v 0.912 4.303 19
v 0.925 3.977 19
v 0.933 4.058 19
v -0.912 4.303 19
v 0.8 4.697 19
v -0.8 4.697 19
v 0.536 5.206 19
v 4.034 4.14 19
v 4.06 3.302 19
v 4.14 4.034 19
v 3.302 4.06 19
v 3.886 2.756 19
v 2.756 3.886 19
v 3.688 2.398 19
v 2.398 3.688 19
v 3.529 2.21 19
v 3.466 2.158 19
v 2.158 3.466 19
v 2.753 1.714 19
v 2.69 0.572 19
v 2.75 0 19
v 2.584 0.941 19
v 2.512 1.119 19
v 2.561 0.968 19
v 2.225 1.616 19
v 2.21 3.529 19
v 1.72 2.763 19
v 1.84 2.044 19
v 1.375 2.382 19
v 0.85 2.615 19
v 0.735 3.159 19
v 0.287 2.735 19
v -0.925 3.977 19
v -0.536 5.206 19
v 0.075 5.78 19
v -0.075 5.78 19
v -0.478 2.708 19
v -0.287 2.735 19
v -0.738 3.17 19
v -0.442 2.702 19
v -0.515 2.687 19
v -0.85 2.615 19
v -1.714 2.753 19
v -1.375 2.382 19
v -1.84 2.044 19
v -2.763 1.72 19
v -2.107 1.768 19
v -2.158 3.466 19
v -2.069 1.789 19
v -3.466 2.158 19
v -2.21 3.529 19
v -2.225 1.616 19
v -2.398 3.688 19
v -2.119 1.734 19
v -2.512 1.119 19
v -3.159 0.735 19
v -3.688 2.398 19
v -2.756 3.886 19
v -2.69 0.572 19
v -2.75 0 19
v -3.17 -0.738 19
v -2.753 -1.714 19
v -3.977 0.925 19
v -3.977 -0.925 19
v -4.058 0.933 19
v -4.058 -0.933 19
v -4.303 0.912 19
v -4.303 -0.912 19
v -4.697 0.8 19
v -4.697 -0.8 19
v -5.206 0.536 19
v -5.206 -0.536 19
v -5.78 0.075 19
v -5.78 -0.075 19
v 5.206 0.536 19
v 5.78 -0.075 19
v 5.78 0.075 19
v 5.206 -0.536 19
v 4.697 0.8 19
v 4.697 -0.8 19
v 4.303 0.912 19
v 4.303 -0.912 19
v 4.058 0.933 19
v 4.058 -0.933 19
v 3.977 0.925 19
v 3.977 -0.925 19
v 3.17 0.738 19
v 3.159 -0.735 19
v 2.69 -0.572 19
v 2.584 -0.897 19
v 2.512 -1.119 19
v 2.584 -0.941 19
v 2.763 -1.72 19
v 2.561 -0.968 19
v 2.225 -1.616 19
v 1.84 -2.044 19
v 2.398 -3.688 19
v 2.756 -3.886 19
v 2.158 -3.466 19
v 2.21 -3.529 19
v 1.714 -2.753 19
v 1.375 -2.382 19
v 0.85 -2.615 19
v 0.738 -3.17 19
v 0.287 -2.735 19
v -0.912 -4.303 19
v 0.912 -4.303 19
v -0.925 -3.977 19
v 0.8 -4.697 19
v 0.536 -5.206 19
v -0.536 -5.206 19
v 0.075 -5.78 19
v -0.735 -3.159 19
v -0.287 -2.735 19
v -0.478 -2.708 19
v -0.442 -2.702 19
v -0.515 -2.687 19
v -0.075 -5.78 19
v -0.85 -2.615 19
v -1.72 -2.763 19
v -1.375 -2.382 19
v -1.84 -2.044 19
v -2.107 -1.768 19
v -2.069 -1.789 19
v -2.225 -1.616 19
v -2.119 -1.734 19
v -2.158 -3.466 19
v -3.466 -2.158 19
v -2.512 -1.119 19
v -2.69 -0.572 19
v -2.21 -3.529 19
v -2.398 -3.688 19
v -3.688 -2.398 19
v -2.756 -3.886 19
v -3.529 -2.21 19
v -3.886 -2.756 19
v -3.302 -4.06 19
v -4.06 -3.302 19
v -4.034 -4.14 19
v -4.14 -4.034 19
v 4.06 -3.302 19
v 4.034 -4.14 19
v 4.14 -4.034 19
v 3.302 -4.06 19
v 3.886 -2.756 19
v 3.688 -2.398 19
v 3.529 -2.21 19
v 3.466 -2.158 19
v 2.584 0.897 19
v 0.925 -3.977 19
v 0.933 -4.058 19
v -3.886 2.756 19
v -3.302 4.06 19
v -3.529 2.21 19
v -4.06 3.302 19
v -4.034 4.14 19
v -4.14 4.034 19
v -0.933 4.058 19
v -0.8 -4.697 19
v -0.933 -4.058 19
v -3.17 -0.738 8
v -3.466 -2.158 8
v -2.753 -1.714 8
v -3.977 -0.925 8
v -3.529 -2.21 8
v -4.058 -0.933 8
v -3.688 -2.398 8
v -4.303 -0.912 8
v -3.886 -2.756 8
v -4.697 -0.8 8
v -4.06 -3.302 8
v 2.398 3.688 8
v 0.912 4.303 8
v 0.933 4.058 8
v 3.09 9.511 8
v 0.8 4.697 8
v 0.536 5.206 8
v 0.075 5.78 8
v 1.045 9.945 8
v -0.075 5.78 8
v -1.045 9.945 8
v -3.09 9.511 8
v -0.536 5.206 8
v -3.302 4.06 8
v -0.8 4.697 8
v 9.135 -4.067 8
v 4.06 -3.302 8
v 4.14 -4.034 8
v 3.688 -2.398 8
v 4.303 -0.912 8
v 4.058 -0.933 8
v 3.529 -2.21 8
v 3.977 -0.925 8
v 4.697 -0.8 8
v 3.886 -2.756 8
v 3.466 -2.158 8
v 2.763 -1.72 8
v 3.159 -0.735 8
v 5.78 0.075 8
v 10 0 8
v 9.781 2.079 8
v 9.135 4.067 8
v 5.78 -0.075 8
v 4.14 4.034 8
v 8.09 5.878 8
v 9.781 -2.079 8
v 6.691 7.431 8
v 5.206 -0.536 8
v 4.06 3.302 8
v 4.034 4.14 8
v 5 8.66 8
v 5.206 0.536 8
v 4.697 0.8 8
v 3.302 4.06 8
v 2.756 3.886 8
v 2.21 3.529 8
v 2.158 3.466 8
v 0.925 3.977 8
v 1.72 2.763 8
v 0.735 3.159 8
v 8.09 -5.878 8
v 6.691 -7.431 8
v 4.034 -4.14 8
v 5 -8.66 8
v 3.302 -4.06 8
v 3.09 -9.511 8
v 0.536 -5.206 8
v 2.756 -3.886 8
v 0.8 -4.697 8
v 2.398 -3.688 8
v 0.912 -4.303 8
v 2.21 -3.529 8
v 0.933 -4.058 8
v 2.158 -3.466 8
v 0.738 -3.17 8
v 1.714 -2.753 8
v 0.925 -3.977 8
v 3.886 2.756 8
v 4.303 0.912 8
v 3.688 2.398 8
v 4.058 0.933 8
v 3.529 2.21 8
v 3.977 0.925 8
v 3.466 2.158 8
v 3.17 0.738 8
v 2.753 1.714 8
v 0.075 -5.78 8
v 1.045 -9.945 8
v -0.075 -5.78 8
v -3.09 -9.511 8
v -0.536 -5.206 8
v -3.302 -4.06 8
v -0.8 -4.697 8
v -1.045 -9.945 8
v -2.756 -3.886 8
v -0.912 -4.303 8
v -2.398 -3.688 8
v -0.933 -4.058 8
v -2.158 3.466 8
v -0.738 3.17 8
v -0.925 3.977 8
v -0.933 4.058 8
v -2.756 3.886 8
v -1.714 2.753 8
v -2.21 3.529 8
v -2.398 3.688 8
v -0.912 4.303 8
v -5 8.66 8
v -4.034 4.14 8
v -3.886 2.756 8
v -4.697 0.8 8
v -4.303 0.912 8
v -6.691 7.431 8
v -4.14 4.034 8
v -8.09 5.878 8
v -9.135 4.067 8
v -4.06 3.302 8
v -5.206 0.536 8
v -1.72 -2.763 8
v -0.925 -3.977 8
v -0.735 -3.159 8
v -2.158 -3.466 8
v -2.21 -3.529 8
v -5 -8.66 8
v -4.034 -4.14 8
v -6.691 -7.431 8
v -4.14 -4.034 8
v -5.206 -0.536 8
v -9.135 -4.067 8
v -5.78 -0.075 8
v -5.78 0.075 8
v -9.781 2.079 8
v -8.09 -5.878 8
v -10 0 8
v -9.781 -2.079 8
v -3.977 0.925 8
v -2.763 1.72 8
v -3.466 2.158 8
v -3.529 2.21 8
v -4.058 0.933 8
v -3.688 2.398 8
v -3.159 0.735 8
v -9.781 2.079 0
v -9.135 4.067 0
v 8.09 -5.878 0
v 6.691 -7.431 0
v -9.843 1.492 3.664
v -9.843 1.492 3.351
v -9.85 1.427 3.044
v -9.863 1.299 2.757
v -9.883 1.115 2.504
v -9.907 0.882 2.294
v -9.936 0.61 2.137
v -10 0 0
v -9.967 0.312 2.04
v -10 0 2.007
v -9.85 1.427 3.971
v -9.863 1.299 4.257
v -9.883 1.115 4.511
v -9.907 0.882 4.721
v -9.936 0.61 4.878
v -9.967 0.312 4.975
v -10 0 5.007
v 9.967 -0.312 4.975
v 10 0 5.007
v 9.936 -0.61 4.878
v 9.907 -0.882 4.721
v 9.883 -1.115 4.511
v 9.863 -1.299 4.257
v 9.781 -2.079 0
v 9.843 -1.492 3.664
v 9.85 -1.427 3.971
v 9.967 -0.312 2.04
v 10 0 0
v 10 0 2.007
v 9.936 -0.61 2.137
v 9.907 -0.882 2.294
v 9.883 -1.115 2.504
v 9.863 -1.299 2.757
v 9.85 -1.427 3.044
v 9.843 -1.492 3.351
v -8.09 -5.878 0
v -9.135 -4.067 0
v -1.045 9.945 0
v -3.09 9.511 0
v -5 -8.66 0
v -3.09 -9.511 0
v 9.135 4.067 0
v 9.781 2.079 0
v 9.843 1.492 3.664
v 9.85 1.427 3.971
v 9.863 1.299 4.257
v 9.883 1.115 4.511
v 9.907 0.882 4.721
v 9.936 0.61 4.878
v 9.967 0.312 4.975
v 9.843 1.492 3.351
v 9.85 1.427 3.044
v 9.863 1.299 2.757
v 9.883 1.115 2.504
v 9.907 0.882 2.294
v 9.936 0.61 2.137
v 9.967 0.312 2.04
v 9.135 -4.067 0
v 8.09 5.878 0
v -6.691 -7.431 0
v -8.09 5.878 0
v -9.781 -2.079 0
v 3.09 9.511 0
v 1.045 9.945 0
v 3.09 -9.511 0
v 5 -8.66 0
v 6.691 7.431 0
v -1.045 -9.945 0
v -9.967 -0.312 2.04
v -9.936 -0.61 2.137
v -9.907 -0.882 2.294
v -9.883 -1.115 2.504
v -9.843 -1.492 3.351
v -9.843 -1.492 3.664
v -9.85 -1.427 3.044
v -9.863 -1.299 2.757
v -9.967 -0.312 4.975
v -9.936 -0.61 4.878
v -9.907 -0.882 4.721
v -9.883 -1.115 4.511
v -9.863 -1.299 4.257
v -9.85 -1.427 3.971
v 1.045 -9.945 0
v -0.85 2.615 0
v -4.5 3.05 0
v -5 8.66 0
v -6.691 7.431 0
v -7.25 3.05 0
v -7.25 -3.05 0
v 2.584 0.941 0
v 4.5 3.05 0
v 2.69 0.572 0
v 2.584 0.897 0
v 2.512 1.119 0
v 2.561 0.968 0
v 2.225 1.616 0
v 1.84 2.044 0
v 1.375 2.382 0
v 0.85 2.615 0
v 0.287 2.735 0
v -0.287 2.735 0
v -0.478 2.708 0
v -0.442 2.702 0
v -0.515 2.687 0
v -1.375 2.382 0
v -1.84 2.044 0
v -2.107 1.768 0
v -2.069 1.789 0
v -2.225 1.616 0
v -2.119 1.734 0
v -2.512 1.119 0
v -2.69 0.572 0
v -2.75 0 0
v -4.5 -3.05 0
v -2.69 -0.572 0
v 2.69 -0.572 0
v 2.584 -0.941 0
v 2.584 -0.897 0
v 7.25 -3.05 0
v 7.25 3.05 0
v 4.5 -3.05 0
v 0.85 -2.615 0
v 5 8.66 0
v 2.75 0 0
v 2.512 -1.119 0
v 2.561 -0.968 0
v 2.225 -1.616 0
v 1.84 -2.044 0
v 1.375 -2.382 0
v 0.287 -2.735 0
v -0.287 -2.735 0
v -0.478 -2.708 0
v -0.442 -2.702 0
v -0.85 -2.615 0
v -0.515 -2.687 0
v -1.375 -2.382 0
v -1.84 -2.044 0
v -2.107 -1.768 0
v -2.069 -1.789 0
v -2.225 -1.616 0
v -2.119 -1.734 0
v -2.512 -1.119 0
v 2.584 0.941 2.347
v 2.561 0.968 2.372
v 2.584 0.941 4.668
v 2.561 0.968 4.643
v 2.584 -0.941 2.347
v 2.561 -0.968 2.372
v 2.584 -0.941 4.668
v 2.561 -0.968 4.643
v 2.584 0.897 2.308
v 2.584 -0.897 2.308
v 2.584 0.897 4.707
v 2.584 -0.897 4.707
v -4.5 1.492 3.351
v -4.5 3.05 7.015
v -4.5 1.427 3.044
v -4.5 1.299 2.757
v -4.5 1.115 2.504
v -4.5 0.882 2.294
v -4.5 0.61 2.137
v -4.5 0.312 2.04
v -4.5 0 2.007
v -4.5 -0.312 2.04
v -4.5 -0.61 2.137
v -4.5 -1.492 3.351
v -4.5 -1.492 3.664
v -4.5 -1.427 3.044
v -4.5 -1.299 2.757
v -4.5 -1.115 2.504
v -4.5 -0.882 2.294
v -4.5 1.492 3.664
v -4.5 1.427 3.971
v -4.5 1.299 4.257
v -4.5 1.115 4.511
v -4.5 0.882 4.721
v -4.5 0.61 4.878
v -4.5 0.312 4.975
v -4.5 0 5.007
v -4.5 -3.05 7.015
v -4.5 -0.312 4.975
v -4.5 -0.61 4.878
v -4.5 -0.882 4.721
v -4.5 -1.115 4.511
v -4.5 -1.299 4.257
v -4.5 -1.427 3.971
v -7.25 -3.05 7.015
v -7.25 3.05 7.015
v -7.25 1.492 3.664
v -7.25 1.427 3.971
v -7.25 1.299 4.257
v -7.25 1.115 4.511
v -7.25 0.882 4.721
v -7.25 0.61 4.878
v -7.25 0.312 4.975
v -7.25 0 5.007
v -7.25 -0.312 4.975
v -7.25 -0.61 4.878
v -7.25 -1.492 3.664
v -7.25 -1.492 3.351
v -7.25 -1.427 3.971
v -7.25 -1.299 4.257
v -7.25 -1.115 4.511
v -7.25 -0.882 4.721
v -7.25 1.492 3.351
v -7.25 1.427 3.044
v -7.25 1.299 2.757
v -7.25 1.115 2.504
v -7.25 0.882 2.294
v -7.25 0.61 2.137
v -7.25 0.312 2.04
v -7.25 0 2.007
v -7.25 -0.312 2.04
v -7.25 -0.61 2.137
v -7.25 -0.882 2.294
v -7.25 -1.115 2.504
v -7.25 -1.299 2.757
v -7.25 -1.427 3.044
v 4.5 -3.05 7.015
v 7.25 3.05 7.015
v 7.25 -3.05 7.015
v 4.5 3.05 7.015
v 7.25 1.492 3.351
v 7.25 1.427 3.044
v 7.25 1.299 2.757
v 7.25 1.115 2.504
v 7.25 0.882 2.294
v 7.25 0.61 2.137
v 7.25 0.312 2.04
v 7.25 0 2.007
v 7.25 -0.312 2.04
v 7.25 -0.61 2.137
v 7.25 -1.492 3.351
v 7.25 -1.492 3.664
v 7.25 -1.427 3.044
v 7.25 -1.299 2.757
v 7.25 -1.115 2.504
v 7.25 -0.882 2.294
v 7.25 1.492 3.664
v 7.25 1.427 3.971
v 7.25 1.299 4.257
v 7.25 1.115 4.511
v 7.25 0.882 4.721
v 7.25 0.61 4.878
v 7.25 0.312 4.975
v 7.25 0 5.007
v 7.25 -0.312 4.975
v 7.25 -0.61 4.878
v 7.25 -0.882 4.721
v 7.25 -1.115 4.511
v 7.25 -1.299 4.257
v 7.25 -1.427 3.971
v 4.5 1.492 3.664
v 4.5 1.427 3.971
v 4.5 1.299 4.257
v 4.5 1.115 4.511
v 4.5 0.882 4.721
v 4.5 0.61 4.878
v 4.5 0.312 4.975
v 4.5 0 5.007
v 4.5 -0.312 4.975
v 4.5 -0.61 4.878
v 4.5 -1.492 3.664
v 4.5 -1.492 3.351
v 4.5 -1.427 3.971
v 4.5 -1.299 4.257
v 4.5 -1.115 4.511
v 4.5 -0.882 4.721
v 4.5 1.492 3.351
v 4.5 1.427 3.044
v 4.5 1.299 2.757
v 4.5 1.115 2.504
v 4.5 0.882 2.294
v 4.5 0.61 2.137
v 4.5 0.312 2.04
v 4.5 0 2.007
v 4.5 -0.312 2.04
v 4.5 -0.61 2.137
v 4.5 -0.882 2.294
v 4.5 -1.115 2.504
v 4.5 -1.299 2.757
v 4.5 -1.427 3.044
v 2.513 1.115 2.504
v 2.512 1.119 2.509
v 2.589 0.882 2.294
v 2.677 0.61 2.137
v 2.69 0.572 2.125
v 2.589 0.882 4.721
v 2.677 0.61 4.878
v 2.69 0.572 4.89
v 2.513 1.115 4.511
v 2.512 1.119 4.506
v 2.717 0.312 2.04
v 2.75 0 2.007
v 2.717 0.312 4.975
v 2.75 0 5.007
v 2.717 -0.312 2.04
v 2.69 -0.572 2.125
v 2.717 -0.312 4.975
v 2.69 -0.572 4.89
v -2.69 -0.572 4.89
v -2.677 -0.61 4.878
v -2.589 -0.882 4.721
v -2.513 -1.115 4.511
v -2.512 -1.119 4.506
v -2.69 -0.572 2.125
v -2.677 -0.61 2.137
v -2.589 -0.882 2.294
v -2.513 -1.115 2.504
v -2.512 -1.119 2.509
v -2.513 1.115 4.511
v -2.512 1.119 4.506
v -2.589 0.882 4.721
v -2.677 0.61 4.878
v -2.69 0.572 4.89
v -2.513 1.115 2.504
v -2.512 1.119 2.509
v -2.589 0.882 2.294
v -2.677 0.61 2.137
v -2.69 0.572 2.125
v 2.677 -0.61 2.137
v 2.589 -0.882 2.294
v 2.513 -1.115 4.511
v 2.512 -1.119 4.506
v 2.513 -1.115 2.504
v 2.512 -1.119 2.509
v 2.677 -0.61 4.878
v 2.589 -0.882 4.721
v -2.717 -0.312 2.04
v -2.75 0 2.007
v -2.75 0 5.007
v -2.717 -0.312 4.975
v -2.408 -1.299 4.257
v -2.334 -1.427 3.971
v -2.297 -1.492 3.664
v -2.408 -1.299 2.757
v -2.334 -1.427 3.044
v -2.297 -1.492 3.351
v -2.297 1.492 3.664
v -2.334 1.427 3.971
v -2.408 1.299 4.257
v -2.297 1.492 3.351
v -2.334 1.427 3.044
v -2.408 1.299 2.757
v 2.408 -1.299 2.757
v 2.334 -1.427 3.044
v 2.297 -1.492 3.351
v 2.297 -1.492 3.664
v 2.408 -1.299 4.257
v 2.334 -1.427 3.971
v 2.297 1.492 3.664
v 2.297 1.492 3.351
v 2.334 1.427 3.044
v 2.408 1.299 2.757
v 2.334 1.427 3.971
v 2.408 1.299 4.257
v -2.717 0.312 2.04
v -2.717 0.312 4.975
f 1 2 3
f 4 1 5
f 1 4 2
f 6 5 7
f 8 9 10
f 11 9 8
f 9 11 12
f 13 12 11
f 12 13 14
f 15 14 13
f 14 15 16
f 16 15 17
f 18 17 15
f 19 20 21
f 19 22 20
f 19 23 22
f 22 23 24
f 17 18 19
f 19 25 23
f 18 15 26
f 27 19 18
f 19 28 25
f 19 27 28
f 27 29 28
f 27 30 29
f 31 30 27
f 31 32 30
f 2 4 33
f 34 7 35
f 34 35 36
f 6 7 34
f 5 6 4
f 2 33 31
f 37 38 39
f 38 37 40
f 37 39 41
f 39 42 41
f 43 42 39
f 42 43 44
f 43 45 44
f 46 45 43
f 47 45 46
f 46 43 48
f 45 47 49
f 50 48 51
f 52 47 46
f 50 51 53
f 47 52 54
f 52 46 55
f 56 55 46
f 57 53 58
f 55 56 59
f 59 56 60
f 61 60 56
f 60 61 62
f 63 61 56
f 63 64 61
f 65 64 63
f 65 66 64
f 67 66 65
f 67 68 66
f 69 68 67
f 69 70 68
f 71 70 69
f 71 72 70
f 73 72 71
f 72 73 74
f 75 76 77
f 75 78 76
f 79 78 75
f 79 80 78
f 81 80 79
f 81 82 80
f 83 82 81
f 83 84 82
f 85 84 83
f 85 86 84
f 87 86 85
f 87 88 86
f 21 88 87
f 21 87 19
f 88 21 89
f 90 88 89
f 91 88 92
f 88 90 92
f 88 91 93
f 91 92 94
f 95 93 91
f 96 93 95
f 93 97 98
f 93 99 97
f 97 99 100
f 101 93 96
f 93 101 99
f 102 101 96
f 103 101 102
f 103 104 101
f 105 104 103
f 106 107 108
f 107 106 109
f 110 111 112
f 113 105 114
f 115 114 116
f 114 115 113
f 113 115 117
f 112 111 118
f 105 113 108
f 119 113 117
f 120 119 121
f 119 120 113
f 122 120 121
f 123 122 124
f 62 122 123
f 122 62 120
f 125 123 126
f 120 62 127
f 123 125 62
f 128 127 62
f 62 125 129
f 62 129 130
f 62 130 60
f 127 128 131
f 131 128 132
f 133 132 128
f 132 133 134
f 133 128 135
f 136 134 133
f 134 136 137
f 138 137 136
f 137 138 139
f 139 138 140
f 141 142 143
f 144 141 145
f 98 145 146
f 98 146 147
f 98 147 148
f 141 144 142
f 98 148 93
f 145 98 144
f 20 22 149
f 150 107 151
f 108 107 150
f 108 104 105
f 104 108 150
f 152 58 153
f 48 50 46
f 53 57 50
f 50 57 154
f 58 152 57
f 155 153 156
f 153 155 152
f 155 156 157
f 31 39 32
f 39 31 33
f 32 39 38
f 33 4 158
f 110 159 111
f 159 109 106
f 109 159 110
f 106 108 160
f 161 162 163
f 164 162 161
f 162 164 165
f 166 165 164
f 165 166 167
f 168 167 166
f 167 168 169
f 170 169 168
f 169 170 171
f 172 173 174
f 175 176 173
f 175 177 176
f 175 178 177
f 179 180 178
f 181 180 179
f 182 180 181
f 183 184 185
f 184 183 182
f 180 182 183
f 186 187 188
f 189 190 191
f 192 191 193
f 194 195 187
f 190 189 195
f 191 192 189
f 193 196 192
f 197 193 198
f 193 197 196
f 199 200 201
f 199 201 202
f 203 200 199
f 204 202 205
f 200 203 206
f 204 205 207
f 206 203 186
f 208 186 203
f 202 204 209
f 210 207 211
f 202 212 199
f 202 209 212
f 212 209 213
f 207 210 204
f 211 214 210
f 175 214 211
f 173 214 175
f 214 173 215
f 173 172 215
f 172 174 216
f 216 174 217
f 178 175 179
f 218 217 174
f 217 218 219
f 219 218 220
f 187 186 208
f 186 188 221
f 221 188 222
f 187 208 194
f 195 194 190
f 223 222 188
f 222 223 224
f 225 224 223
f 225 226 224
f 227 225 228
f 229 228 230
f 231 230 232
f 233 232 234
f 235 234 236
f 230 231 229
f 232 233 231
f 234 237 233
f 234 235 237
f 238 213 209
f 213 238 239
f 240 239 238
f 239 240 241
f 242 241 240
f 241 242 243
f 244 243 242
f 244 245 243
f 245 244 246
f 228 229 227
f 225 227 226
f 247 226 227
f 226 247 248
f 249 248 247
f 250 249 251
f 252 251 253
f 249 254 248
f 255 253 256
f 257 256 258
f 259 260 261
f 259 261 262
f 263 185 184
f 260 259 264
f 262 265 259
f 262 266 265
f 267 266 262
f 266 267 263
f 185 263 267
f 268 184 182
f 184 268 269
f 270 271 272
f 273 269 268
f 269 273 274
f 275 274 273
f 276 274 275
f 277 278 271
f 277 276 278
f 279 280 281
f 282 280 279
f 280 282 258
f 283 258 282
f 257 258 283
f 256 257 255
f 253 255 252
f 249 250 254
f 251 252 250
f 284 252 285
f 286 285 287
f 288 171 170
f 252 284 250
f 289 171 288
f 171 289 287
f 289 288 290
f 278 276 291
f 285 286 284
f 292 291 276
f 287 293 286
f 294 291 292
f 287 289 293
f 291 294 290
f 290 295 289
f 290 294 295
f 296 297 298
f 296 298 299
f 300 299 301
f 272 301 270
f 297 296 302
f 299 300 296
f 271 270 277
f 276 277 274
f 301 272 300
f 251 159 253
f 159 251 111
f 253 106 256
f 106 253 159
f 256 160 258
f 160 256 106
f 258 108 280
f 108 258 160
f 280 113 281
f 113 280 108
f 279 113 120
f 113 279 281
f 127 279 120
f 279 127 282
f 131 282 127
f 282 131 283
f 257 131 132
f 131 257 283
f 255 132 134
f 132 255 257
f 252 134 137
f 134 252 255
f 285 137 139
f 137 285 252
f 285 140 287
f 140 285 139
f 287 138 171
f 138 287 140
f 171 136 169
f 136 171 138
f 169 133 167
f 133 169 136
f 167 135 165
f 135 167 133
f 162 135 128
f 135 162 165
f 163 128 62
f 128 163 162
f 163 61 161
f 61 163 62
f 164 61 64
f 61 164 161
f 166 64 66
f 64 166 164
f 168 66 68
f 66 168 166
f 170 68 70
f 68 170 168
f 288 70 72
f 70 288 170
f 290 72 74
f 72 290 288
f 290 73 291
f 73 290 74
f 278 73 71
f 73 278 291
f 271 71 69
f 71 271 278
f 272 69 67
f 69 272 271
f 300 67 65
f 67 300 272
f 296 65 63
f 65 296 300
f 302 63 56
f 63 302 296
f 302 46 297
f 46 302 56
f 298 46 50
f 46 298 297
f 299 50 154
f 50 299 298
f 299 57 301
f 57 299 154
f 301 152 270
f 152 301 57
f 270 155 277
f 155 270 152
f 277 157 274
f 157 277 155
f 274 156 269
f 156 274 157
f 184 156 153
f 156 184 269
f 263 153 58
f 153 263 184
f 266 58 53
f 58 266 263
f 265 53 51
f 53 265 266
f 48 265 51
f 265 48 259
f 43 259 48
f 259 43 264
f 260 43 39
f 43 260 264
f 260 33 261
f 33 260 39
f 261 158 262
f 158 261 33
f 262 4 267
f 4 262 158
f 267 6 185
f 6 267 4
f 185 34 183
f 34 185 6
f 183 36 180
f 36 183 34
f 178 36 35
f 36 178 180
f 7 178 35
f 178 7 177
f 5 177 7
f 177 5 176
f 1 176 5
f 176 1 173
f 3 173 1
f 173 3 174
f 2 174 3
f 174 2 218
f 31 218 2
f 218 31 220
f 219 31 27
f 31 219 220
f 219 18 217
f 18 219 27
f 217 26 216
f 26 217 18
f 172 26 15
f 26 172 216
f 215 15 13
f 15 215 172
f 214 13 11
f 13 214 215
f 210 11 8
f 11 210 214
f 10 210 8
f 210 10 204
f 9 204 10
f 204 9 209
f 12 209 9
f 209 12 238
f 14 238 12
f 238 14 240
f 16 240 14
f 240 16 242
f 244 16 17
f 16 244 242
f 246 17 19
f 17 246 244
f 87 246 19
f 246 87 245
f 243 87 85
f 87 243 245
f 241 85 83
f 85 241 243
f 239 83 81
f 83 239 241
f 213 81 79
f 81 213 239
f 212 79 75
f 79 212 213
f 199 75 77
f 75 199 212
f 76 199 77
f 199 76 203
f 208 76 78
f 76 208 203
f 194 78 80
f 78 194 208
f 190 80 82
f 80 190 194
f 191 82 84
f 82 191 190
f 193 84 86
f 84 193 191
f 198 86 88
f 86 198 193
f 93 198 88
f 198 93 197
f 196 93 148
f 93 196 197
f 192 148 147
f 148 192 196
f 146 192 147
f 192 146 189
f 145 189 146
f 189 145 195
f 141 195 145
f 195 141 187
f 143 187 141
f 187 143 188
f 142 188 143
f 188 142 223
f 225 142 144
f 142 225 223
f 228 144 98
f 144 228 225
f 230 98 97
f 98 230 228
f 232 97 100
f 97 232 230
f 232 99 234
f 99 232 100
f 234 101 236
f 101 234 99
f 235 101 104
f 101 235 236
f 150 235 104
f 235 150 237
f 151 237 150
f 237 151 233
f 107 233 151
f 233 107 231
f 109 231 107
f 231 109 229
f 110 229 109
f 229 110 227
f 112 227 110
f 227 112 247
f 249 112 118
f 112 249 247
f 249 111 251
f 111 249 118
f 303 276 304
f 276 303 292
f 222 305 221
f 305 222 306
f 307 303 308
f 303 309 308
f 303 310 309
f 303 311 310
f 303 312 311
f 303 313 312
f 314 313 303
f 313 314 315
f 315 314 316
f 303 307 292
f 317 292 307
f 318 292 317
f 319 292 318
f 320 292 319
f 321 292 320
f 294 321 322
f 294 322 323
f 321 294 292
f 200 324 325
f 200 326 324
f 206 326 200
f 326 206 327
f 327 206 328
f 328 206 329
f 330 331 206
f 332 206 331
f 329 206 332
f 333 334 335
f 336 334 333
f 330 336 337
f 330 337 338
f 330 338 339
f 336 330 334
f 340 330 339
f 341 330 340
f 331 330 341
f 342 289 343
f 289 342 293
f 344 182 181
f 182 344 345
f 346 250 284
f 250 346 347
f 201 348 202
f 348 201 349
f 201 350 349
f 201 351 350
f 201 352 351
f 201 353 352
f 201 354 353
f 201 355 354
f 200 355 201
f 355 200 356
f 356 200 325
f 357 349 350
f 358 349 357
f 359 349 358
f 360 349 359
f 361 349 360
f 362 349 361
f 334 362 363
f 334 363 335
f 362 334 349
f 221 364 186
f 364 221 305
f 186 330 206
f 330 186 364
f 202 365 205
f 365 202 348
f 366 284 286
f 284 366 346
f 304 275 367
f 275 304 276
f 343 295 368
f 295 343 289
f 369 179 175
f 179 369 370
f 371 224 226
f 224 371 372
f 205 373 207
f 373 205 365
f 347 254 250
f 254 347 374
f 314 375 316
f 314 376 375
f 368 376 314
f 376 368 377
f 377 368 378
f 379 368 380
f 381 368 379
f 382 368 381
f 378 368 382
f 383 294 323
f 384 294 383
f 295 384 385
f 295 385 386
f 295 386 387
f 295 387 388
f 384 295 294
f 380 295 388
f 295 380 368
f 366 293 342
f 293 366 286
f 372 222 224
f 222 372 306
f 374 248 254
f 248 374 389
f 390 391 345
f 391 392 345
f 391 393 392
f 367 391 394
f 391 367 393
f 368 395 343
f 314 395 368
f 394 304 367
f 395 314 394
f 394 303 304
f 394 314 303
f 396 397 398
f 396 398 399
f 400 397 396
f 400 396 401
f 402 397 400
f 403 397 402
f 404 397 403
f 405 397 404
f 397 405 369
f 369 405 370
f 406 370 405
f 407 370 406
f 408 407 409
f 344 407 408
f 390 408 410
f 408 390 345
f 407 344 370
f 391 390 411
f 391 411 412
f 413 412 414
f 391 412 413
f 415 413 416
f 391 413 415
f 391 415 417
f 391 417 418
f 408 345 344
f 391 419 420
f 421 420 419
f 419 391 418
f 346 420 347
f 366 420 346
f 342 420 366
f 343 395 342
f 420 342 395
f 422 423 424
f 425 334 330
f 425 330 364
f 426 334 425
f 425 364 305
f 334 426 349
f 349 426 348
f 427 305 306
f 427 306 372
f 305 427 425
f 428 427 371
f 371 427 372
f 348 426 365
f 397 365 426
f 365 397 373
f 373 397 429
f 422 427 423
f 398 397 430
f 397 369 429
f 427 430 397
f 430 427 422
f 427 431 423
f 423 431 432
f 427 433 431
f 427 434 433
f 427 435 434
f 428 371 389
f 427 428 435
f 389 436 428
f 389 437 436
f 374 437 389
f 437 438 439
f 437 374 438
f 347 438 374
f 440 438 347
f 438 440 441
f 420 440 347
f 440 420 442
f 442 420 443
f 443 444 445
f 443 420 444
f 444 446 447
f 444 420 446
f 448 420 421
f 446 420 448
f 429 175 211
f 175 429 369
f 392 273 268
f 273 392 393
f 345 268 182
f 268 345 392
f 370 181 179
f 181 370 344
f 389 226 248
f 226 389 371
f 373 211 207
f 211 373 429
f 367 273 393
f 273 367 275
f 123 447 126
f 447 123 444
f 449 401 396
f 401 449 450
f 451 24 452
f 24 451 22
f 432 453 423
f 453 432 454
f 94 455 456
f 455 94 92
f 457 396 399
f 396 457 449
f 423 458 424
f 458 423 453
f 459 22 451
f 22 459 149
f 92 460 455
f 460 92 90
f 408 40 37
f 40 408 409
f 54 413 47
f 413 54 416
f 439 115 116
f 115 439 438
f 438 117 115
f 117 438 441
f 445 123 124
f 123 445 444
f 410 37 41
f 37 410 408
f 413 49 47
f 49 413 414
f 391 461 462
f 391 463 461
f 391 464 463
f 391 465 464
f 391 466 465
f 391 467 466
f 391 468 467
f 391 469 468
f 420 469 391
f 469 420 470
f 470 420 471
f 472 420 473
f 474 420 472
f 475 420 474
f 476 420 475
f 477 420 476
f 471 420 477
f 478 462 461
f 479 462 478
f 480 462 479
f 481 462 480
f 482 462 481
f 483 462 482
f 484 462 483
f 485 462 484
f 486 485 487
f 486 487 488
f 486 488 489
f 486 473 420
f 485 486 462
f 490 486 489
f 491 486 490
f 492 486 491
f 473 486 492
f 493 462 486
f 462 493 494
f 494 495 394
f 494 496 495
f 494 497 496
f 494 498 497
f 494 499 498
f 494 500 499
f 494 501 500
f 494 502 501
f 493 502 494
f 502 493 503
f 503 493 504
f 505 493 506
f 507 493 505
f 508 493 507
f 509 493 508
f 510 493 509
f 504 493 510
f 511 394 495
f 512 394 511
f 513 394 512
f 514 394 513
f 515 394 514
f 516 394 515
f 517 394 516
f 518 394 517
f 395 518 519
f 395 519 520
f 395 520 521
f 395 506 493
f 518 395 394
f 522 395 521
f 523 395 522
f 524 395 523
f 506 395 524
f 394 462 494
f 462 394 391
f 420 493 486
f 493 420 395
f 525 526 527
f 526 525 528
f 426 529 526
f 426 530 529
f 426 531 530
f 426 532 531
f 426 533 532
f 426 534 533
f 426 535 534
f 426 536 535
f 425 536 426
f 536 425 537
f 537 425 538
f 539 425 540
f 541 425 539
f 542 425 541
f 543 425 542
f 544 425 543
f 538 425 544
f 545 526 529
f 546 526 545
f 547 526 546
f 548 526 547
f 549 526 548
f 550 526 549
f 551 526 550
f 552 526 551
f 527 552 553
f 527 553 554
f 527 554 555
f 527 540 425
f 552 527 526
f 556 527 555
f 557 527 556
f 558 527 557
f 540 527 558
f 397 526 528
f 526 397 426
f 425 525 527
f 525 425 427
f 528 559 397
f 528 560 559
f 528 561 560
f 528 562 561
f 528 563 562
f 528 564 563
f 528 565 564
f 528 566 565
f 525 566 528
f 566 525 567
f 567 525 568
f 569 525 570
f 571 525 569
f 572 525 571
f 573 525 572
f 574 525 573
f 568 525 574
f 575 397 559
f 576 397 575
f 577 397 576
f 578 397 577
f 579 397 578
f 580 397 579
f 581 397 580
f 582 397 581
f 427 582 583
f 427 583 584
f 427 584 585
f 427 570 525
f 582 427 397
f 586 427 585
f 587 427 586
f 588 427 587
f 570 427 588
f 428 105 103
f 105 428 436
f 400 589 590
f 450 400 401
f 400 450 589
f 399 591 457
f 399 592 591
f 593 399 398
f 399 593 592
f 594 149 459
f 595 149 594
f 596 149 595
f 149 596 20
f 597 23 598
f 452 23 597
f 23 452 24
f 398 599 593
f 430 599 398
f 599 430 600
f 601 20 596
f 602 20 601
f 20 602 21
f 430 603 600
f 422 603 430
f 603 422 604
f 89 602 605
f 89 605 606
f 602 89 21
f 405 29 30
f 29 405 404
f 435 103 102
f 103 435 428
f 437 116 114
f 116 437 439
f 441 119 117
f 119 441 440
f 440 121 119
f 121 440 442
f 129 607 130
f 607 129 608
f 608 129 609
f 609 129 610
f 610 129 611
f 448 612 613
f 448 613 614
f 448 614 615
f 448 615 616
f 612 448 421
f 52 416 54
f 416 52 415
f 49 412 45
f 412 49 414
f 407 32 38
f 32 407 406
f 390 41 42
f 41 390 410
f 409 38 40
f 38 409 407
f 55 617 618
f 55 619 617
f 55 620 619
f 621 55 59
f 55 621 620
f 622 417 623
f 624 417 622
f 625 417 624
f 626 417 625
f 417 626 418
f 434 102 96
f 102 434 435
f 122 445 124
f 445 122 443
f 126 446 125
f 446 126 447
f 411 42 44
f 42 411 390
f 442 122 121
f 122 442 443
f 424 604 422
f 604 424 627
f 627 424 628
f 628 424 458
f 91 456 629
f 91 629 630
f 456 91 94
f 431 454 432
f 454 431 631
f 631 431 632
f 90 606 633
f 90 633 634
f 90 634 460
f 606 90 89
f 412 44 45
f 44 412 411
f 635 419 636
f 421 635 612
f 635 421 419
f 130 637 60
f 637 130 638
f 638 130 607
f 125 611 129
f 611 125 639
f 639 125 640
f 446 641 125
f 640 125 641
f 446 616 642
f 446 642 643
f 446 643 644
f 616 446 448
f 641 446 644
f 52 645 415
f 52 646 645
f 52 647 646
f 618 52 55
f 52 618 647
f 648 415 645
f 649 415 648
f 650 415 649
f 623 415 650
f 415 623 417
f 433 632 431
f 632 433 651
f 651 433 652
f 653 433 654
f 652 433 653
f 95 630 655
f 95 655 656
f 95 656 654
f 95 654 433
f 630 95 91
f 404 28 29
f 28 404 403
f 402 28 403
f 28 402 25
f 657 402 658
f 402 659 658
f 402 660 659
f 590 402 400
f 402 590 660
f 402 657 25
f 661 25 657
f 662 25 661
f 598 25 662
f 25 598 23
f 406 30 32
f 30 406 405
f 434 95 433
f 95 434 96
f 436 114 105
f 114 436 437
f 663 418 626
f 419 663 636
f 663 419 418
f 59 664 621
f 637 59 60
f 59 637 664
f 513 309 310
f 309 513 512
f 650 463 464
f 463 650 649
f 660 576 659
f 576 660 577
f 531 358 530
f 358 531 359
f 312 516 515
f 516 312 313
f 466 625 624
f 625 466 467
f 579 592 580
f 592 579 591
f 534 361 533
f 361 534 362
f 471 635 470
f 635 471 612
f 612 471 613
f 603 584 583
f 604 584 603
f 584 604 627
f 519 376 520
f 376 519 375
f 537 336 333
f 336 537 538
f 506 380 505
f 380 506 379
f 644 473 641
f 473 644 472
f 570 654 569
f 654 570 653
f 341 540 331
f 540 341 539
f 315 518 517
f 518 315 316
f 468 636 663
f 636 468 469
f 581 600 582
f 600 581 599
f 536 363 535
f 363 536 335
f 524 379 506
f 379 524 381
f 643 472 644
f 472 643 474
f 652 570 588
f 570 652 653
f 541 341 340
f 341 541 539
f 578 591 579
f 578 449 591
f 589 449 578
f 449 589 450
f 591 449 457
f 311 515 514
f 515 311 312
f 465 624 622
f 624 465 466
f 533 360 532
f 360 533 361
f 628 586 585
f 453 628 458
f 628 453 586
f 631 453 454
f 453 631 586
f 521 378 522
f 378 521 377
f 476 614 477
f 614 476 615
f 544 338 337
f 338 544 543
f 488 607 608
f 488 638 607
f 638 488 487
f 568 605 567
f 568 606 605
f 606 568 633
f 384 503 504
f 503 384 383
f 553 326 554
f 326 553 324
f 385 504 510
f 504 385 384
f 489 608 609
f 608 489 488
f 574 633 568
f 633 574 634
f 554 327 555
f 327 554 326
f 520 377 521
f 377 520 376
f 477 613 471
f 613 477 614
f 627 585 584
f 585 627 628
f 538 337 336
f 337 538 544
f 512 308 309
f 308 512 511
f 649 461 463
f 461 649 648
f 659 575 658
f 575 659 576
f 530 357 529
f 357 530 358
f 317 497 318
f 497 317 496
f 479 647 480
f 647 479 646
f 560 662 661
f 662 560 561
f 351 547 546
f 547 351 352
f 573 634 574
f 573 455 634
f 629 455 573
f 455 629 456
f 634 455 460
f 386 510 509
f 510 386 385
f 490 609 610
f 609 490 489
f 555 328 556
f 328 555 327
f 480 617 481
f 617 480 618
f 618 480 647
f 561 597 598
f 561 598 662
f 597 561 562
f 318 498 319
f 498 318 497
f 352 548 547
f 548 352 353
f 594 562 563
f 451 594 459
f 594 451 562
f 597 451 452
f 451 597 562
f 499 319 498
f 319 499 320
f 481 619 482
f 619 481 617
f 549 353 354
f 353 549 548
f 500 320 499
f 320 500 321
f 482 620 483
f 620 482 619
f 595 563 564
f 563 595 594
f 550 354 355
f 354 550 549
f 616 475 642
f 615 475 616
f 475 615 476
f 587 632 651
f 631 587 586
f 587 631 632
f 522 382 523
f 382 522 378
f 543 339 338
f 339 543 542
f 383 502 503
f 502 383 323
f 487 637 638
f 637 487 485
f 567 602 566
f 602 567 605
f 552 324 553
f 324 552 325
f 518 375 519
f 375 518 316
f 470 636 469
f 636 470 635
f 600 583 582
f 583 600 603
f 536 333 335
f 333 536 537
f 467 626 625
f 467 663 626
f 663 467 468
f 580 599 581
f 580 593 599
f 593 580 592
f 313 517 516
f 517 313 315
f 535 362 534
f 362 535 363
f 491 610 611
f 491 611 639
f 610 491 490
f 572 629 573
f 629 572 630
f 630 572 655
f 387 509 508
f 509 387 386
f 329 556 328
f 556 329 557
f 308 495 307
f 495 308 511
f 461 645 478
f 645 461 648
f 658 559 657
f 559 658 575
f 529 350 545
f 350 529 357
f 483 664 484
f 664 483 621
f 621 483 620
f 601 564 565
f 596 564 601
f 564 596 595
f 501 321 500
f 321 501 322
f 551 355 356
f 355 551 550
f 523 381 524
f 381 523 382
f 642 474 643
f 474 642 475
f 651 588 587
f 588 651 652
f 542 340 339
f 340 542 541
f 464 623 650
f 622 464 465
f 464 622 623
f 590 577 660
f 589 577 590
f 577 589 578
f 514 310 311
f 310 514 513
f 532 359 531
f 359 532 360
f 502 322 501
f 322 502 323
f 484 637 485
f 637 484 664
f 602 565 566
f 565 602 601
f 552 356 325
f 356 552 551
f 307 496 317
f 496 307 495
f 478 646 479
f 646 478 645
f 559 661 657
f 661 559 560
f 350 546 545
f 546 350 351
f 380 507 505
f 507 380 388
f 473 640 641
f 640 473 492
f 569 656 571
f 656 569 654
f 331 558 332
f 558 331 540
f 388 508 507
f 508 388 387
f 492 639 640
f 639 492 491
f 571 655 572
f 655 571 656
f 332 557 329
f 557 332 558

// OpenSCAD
/**
 * @author      Ben
 * @date        2021/07/26
 * @description Stackable Planetary Gearbox for 775 DC Motor
 */
use <involute_gears.scad>

//default settings
// pitch=0.865;            //diametric pitch = teeth/diam
// gear_thickness=11;
// pilot_diam=23;

clearance=0.5;
backlash=0.45;
pressure_angle=28;
wall=1;
extra=0.01;
circle_precision=0.1;
addendum_adjustment=1.4;

//test();
// part can be: [sun, intcarrier, finalcarrier, planet, housing, motor, cover]
print_parts(part="sun", stages=1);
// print_parts(part="planet", stages=1);
// print_parts(part="housing", stages=1);
// print_parts(part="motor", stages=1);
// print_parts(part="cover", stages=1);
// print_parts(part="intcarrier", stages=1);
// print_parts(part="finalcarrier", stages=1);


//singleprint();
//multistage_assembly(stages=4);
//housing();
//sun();
//planet();
//carrier(final=false);
//cover();

// part can be sun, intcarrier, finalcarrier, planet, housing or cover
module print_parts(ring_teeth=32, sun_teeth=8, stages=2, part="housing") {
    ratio=pow(1/(1+ring_teeth/sun_teeth),stages);
    echo("Final Ratio:", 1/ratio);
    echo("BOM");
    echo("Housings:", 1);
    echo("Sun Gears:", 1);
    echo("Planet Gears:", 3*stages);
    echo("Intermediate Carriers:", stages-1);
    echo("Final Carriers:", 1);
    echo("Covers:", 1);
    
    if (part=="housing") {
        housing(housing_teeth=ring_teeth, stages=stages);
    } else if (part=="motor") {
        motorMount(stages=stages);
    } else if (part=="sun") {
        sun(teeth=sun_teeth);
    } else if (part=="planet") {
        planet(teeth=(ring_teeth-sun_teeth)/2);
    } else if (part=="intcarrier") {
        carrier(final=false,teeth=sun_teeth);
    } else if (part=="finalcarrier") {
        carrier();
    } else if (part=="cover") {
        cover();
    }
}
/**/

//
module test() {
    ring_teeth=32;
    sun_teeth=8;
    motor_size=42;
    num_planets=3;
    pitch=0.865;
    
    ratio=1/(1+ring_teeth/sun_teeth);
    echo("Gear Ratio:", 1/ratio);

    planet_teeth=(ring_teeth-sun_teeth)/2;
    orbit_radius=((planet_teeth+sun_teeth)/pitch)/2;
    test_ring(teeth=ring_teeth);
    translate([motor_size/2+2.5,motor_size/2+10,0]) planet(teeth=sun_teeth, bearing_diam=0, bore=0);
    translate([motor_size+5,motor_size+5,0]) for (planetnum=[1:num_planets]) rotate([0,0,(360/num_planets)*(planetnum-0.5)]) translate([0,orbit_radius ,0]) rotate([0,0,0]) planet(bearing_diam=0, bore=0);
    //translate([0,motor_size+7,0]) carrier();
}
/**/

module multistage_assembly(num_planets=3, gear_height=12, gear_thickness=11, carrier_thickness=6, sun_teeth=8, planet_teeth=12, pitch=0.865, stages=2) {
    orbit_radius=((planet_teeth+sun_teeth)/pitch)/2;
    housing_thickness=gear_height+gear_thickness*stages+carrier_thickness*stages;

    sun();
    
    for (stagenum=[1:stages])
    {
        for (planetnum=[1:num_planets]) rotate([0,0,(360/num_planets)*(planetnum-1)]) translate([orbit_radius, 0 ,gear_height+(carrier_thickness+gear_thickness)*(stagenum-1)]) rotate([0,0,0]) planet();
        translate([0,0,gear_height+gear_thickness*stagenum+carrier_thickness*(stagenum-1)]) if (stagenum==stages) {
            carrier();
        } else {
             carrier(final=false);
        }
    }
    %housing(stages=stages);
    %translate([0,0,housing_thickness]) cover();
    
}
/**/

module singleprint() {
    ring_teeth=32;
    sun_teeth=8;
    motor_size=42;
    num_planets=3;
    pitch=0.865;
    cover_thickness=8;

    ratio=1/(1+ring_teeth/sun_teeth);
    echo("Gear Ratio:", 1/ratio);

    planet_teeth=(ring_teeth-sun_teeth)/2;
    orbit_radius=((planet_teeth+sun_teeth)/pitch)/2;
    housing(housing_teeth=ring_teeth,pitch=pitch);
    translate([motor_size/2+2.5,motor_size/2+10,0]) sun(teeth=sun_teeth,pitch=pitch);
    translate([motor_size+5,motor_size+5,0]) for (planetnum=[1:num_planets]) rotate([0,0,(360/num_planets)*(planetnum-0.5)]) translate([0,orbit_radius ,0]) rotate([0,0,0]) planet(teeth=planet_teeth,pitch=pitch);
    translate([motor_size+5,0,cover_thickness]) rotate([0,180,0]) cover();
    translate([0,motor_size+7,0]) carrier();
}
/**/

module multistage_assembly(num_planets=3, gear_height=12, gear_thickness=11, carrier_thickness=6, sun_teeth=8, planet_teeth=12, pitch=0.865, stages=2) {
    orbit_radius=((planet_teeth+sun_teeth)/pitch)/2;
    housing_thickness=gear_height+gear_thickness*stages+carrier_thickness*stages;

    sun();
    
    for (stagenum=[1:stages])
    {
        for (planetnum=[1:num_planets]) rotate([0,0,(360/num_planets)*(planetnum-1)]) translate([orbit_radius, 0 ,gear_height+(carrier_thickness+gear_thickness)*(stagenum-1)]) rotate([0,0,0]) planet();
        translate([0,0,gear_height+gear_thickness*stagenum+carrier_thickness*(stagenum-1)]) if (stagenum==stages) {
            carrier();
        } else {
             carrier(final=false);
        }
    }
    %housing(stages=stages);
    %translate([0,0,housing_thickness]) cover();
    
}
/**/

module planet(teeth=12, pitch=0.865, gear_thickness=11, pressure_angle=pressure_angle, bearing_diam=7.4, bearing_thickness=2.75, bearing_spacing=2, bore=3, vertical_space=1.0) {
    intersection () {
        difference() {
                // outer gear
                gear(number_of_teeth=teeth, diametral_pitch=pitch, hub_diameter=0, hub_thickness=gear_thickness-vertical_space, bore_diameter=bore,
                     rim_thickness=gear_thickness-vertical_space, rim_width=0, gear_thickness=gear_thickness-vertical_space, clearance=clearance,
                     backlash=backlash, pressure_angle=pressure_angle, $fn=10);
                // // upper space
                // translate([0,0,gear_thickness-bearing_thickness-vertical_space]) cylinder(r=bearing_diam/2, h=bearing_thickness+extra);
                // lower space
                translate([0,0,-extra]) cylinder(r=bearing_diam/2, h=gear_thickness-bearing_spacing-bearing_thickness-vertical_space);
                
        }
        // bottom smooth
        cylinder(r1=(teeth/pitch)/2, r2=(teeth/pitch)/2+gear_thickness,h=gear_thickness+extra*2);
    }
}
/**/

module test_ring(motor_size=42, housing_teeth=32, pitch=0.865, pressure_angle=pressure_angle, wall=1, gear_thickness=11) {
    total_height=gear_thickness;
    difference() {
        translate([0,0,total_height/2]) intersection() {
            cube([motor_size,motor_size,total_height], center=true);
            cylinder(r=sqrt(2*pow(motor_size/2,2))-3, h=total_height, center=true);
        }
        gear(number_of_teeth=housing_teeth, diametral_pitch=pitch, hub_diameter=0, bore_diameter=0, rim_thickness=total_height, gear_thickness=total_height,
             clearance=0, backlash=-backlash, pressure_angle=pressure_angle, addendum_adjustment=addendum_adjustment);
    }
}
/**/

/**
 * Piece in between dc motor and housing, where needed
 */
module motorMount(motor_size=42,  stages=1, gear_thickness=11, totalHeight=12, carrier_thickness=6, bolt_spacing=33, bolt_size=3.5) {
    total_height = totalHeight;
    ring_height  = gear_thickness*stages+carrier_thickness*(stages-1);

    translate([0,0,total_height/2]) difference() {
        intersection() {
            cube([motor_size, motor_size, total_height], center=true);
            // cylinder(r=sqrt(2*pow(motor_size/2,2))-3, h=total_height, center=true);
        }
        // mounting holes
        for (xnum=[-1,1]) for (ynum=[-1,1]) {
            translate([xnum*bolt_spacing/2,ynum*bolt_spacing/2,0]) {
                cylinder(r=bolt_size/2, h=total_height+extra, center=true, $fs=circle_precision);
                cylinder(r=3, h=total_height-10, center=true, $fn=6);
                translate([0,ynum*8,0]) cube([6,15,total_height-10], center=true);
            }
        }
        // motor mounting holes
        translate([15, 0, 0]) {
            cylinder(r=3, h=6, $fn=6);      // Hexagon
            cylinder(r=bolt_size/2, h=total_height*2+extra, center=true, $fs=circle_precision);
        }
        translate([-15, 0, 0]) {
            cylinder(r=3, h=6, $fn=6);      // Hexagon
            cylinder(r=bolt_size/2, h=total_height*2+extra, center=true, $fs=circle_precision);
        }
        // central motor shaft rod
        translate([0, 0, -totalHeight+5]) {
            cylinder(d=22, h=5, $fs=circle_precision);
            cylinder(d=7, h=total_height*3+extra, center=true, $fs=circle_precision);
        }
    }
}
/**/

/**
 * housing piece
 */
module housing(motor_size=42, housing_teeth=32, pitch=0.865, pressure_angle=pressure_angle, wall=1, recess_depth=2, stages=1, gear_thickness=11, 
               gear_height=12, pilot_diam=23, pilot_length=2, carrier_thickness=6, bolt_spacing=33, bolt_size=3.5) {
    total_height = gear_height+gear_thickness*stages+carrier_thickness*stages+recess_depth;
    ring_height  = gear_thickness*stages+carrier_thickness*(stages-1);
    gear_diam    = housing_teeth/pitch;

    echo("Housing height:", total_height);
    translate([0,0,total_height/2]) difference() {
        intersection() {
            cube([motor_size,motor_size,total_height], center=true);
            cylinder(r=sqrt(2*pow(motor_size/2,2))-3, h=total_height, center=true);
        }
        for (xnum=[-1,1]) for (ynum=[-1,1]) {
            translate([xnum*bolt_spacing/2,ynum*bolt_spacing/2,0]) {
                cylinder(r=bolt_size/2, h=total_height+extra, center=true, $fs=circle_precision);
                cylinder(r=3, h=total_height-10, center=true, $fn=6);
                translate([0,ynum*8,0]) cube([6,15,total_height-10], center=true);
            }
            
        }
        // bottom hole
        translate([0,0,-total_height/2-extra/2])
                  cylinder(r=pilot_diam/2-2.5,h=pilot_length, $fs=circle_precision);
        // inner funnel [r1=pilot_diam/2]
        translate([0,0,-total_height/2-extra+pilot_length])
                  cylinder(r1=gear_diam/2-1, r2=gear_diam/2-2.5, h=gear_height+extra*2-pilot_length, $fs=circle_precision);
        // top hole
        translate([0,0, total_height/2-recess_depth/2-carrier_thickness/2])
                  cylinder(r=motor_size/2-wall,h=carrier_thickness+recess_depth+extra, center=true, $fs=circle_precision);
        // inner gear
        translate([0,0,gear_height-total_height/2]) 
                  gear(number_of_teeth=housing_teeth, diametral_pitch=pitch, hub_diameter=0, bore_diameter=0, rim_thickness=ring_height+extra,
                                              gear_thickness=ring_height+extra,clearance=0, backlash=-backlash, pressure_angle=pressure_angle);
                                                         // TODO: What is this parameter ???    ,addendum_adjustment=addendum_adjustment);
        // vertical hole for screwdriver inspection
        rotate([0, 90, 0])
            translate([8, 0, 0])
                  cylinder(r=bolt_size, h=40, $fs=circle_precision);   //center=true,
        // Motor mounts
        translate([0, 15, -20])
                cylinder(r=bolt_size, h=15, $fs=circle_precision);   //center=true,
        translate([0, -15, -20])
                cylinder(r=bolt_size, h=15, $fs=circle_precision);   //center=true,
    }

}
/**/

module cover(thickness=8, motor_size=42, bolt_spacing=33, bolt_size=3, bearing_diam=15, bearing_thickness=6, output_hole_diam=10, stickout=1, bolt_relief_depth=4, bolt_relief_ID=25, bolt_relief_OD=35) {
    difference() {
        intersection() {
            union() {
                translate([0,0,thickness/2+stickout/2]) cube([motor_size,motor_size,thickness-stickout],center=true);
                cylinder(r=motor_size/2-wall,h=stickout+extra, $fs=circle_precision);
            }
            cylinder(r=sqrt(2*pow(motor_size/2,2))-3, h=thickness);
        }
        translate([0,0,-extra/2]) difference() {
            cylinder(r=bolt_relief_OD/2, h=bolt_relief_depth);
            // inner cylinder
            translate([0,0,-extra/2]) cylinder(r1=bolt_relief_ID/2-4, r2=bolt_relief_ID/2, h=bolt_relief_depth+extra);
        }
        // Through hole
        translate([0,0,-extra/2]) cylinder(r=output_hole_diam/2,h=thickness+extra);
        // Inner hole near through hole
        translate([0,0,-extra]) cylinder(r=bearing_diam/2, h=bearing_thickness+extra);
        // Four bolts holes
        for (xnum=[-1,1]) for (ynum=[-1,1])
            translate([xnum*bolt_spacing/2,ynum*bolt_spacing/2,-extra/2]) cylinder(r=bolt_size/2, h=thickness+extra, $fs=circle_precision);

    }
}
/**/

/**
 * bore_diam        Inner bore for motor shaft
 * gear_height      Thickness of the non geared part
 * gear_thickness   Thickness of the geared part
 */
module sun( pitch=0.865, teeth=8, gear_thickness=11, gear_height=8, bore_diam=5.5, , hub_diam=20, clearance=0.2, backlash=0.2, pressure_angle=pressure_angle, nut_size=6, nut_thickness=2.75, screw_diam=3) {
    difference() {
        translate([0,0,gear_height+gear_thickness])
            rotate([0,180,0])
            gear(number_of_teeth=teeth, diametral_pitch=pitch, hub_diameter=hub_diam, hub_thickness=gear_height+gear_thickness, bore_diameter=bore_diam,
                 rim_thickness=gear_thickness, rim_width=0, gear_thickness=gear_thickness,clearance=clearance, backlash=backlash, pressure_angle=pressure_angle);
        cylinder(r=bore_diam/2,h=gear_height+gear_thickness, $fs=circle_precision);        // cut out bore for motor shaft
        //cut hole for set screws
        translate([0,0,(nut_size*1.15)/2])
            rotate([0,90,0])
            cylinder(r=screw_diam/2,h=hub_diam+extra, center=true, $fs=circle_precision);
        // cut pocket for set screw nuts
        nut_size = nut_size+0.1;
        for (num=[0:1])
            rotate([0,0,180*num])
            translate([(-hub_diam+bore_diam)/2,-nut_size/2,0])
            cube(size=[nut_thickness,nut_size,nut_size*1.15]);
    }
}
/**/

module carrier(thickness=3, num_planets=3, planet_teeth=12, sun_teeth=8, pitch=0.865, nut_diam=10, nut_thickness=2.75, 
               planet_bolt_diam=3, output_diam=6, output_head_size=10, head_height=4.5, final=true, teeth=8, gear_thickness=11,
               pitch=0.865, pressure_angle=pressure_angle) {
    orbit_radius=((planet_teeth+sun_teeth)/pitch)/2;


    difference() {
        union() {
            // Base plate
            cylinder(r=orbit_radius+nut_diam/2+1, h=thickness-1, $fs=circle_precision);
            // ball bearing crown, lower part cylinder
            translate([0, 0, 2]) {
                cylinder(r1=orbit_radius/2+2,
                         r2=orbit_radius/2,
                         h=thickness);
            }
            // ball bearing crown, upper part cylinder
            translate([0, 0, thickness+2]) {
                cylinder(r1=orbit_radius/2, r2=5,
                        //  r2=output_diam/2,
                        h=1);
            }
            // Gear on NOT final piece
            if (!final) {
                translate([0,0,thickness]) gear(number_of_teeth=teeth, diametral_pitch=pitch, hub_diameter=0, hub_thickness=gear_thickness, bore_diameter=0, rim_thickness=gear_thickness,
                                                rim_width=0, gear_thickness=gear_thickness, clearance=clearance, backlash=backlash, pressure_angle=pressure_angle);
            }
        }
        // Planets
        for (planetnum=[1:num_planets]) {
            rotate([0,0,(360/num_planets)*(planetnum-1)])
                translate([orbit_radius,0,-extra/2]) {
                    // Holes
                    cylinder(r=planet_bolt_diam/2,h=thickness+extra, $fs=circle_precision);
                    // Dig around holes
                    // translate([0,0,thickness-nut_thickness]) cylinder(r=nut_diam/2, h=nut_thickness+extra);
                }
        }
        // Bolt head
        if (final) {
            translate([0,0,-extra/2]) cylinder(r=output_head_size/2*1.15, h=head_height+extra, $fn=6);
        }
        // Bolt hole
        translate([0,0,-extra/2]) cylinder(r=output_diam/2, h=thickness+gear_thickness+extra, $fs=circle_precision);
    }

}
/**/
